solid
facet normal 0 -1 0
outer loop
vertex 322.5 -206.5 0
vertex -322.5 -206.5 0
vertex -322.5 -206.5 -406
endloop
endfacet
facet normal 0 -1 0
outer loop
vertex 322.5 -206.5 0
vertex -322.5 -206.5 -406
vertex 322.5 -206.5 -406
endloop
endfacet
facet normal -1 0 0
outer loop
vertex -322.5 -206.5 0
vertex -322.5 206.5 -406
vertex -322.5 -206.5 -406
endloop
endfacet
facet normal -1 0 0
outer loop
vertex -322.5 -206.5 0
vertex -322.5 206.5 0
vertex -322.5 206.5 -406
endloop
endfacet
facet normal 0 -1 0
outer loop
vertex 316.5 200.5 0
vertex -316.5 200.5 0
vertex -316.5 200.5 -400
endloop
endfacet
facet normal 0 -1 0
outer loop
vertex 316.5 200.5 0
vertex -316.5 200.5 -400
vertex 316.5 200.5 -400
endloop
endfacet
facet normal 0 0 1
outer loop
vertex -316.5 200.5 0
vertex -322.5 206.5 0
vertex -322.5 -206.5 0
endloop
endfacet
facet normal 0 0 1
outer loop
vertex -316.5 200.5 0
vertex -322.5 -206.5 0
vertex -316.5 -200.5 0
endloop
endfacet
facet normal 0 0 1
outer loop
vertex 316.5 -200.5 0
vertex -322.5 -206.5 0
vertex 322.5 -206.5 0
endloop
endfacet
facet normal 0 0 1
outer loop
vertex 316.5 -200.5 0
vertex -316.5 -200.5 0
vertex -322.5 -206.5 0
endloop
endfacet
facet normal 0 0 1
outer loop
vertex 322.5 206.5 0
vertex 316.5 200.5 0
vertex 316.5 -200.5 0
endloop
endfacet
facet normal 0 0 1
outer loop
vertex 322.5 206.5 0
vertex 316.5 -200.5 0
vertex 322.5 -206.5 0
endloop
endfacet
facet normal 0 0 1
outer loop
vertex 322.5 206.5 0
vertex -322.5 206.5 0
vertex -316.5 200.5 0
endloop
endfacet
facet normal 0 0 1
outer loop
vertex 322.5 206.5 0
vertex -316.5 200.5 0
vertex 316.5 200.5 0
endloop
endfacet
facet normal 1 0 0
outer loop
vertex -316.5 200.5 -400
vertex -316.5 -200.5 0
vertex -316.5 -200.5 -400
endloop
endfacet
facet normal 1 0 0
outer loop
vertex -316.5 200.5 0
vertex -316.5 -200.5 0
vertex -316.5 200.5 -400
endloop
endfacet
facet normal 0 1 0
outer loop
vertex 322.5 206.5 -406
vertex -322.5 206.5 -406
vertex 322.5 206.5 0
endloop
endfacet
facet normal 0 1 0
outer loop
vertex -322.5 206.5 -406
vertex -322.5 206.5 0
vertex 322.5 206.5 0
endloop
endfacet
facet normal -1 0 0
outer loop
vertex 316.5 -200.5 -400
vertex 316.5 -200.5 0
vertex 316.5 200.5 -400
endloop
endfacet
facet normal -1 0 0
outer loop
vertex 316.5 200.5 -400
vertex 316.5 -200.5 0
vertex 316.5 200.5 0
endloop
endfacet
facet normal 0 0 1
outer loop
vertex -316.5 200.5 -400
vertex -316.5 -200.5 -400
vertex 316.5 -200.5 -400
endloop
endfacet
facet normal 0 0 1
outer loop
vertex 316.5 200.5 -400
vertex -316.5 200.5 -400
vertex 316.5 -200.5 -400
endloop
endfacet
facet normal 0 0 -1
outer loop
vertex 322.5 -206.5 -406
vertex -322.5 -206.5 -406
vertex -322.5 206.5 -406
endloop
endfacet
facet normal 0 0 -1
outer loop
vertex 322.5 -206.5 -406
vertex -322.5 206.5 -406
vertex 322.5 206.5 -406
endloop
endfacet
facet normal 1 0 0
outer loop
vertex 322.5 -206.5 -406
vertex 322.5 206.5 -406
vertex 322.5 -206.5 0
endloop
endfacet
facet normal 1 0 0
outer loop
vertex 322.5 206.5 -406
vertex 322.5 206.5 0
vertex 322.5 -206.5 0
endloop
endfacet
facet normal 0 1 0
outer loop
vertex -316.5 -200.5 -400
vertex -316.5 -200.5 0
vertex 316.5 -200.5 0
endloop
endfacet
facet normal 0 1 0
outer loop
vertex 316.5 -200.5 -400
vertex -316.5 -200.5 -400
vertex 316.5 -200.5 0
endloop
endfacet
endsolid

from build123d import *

# Parameters (mm, degrees)
F0_W     = 645
F0_H     = 413
F0_W_2   = 633
F0_H_2   = 401
F1_DEPTH = 400
F2_W     = 645
F2_H     = 413
F3_DEPTH = 6


with BuildPart() as f1:
    # F0 (on Top) → F1 (new body)
    with BuildSketch(Plane.XY):
        Rectangle(F0_W, F0_H)
        Rectangle(F0_W_2, F0_H_2, mode=Mode.SUBTRACT)
    extrude(amount=-F1_DEPTH)

    # F2 (on face) → F3 (join)
    with BuildSketch(Plane(origin=(0, 0, -400), x_dir=(1, 0, 0), z_dir=(0, 0, -1))):
        Rectangle(F2_W, F2_H)
    extrude(amount=F3_DEPTH)


solid = f1.part
